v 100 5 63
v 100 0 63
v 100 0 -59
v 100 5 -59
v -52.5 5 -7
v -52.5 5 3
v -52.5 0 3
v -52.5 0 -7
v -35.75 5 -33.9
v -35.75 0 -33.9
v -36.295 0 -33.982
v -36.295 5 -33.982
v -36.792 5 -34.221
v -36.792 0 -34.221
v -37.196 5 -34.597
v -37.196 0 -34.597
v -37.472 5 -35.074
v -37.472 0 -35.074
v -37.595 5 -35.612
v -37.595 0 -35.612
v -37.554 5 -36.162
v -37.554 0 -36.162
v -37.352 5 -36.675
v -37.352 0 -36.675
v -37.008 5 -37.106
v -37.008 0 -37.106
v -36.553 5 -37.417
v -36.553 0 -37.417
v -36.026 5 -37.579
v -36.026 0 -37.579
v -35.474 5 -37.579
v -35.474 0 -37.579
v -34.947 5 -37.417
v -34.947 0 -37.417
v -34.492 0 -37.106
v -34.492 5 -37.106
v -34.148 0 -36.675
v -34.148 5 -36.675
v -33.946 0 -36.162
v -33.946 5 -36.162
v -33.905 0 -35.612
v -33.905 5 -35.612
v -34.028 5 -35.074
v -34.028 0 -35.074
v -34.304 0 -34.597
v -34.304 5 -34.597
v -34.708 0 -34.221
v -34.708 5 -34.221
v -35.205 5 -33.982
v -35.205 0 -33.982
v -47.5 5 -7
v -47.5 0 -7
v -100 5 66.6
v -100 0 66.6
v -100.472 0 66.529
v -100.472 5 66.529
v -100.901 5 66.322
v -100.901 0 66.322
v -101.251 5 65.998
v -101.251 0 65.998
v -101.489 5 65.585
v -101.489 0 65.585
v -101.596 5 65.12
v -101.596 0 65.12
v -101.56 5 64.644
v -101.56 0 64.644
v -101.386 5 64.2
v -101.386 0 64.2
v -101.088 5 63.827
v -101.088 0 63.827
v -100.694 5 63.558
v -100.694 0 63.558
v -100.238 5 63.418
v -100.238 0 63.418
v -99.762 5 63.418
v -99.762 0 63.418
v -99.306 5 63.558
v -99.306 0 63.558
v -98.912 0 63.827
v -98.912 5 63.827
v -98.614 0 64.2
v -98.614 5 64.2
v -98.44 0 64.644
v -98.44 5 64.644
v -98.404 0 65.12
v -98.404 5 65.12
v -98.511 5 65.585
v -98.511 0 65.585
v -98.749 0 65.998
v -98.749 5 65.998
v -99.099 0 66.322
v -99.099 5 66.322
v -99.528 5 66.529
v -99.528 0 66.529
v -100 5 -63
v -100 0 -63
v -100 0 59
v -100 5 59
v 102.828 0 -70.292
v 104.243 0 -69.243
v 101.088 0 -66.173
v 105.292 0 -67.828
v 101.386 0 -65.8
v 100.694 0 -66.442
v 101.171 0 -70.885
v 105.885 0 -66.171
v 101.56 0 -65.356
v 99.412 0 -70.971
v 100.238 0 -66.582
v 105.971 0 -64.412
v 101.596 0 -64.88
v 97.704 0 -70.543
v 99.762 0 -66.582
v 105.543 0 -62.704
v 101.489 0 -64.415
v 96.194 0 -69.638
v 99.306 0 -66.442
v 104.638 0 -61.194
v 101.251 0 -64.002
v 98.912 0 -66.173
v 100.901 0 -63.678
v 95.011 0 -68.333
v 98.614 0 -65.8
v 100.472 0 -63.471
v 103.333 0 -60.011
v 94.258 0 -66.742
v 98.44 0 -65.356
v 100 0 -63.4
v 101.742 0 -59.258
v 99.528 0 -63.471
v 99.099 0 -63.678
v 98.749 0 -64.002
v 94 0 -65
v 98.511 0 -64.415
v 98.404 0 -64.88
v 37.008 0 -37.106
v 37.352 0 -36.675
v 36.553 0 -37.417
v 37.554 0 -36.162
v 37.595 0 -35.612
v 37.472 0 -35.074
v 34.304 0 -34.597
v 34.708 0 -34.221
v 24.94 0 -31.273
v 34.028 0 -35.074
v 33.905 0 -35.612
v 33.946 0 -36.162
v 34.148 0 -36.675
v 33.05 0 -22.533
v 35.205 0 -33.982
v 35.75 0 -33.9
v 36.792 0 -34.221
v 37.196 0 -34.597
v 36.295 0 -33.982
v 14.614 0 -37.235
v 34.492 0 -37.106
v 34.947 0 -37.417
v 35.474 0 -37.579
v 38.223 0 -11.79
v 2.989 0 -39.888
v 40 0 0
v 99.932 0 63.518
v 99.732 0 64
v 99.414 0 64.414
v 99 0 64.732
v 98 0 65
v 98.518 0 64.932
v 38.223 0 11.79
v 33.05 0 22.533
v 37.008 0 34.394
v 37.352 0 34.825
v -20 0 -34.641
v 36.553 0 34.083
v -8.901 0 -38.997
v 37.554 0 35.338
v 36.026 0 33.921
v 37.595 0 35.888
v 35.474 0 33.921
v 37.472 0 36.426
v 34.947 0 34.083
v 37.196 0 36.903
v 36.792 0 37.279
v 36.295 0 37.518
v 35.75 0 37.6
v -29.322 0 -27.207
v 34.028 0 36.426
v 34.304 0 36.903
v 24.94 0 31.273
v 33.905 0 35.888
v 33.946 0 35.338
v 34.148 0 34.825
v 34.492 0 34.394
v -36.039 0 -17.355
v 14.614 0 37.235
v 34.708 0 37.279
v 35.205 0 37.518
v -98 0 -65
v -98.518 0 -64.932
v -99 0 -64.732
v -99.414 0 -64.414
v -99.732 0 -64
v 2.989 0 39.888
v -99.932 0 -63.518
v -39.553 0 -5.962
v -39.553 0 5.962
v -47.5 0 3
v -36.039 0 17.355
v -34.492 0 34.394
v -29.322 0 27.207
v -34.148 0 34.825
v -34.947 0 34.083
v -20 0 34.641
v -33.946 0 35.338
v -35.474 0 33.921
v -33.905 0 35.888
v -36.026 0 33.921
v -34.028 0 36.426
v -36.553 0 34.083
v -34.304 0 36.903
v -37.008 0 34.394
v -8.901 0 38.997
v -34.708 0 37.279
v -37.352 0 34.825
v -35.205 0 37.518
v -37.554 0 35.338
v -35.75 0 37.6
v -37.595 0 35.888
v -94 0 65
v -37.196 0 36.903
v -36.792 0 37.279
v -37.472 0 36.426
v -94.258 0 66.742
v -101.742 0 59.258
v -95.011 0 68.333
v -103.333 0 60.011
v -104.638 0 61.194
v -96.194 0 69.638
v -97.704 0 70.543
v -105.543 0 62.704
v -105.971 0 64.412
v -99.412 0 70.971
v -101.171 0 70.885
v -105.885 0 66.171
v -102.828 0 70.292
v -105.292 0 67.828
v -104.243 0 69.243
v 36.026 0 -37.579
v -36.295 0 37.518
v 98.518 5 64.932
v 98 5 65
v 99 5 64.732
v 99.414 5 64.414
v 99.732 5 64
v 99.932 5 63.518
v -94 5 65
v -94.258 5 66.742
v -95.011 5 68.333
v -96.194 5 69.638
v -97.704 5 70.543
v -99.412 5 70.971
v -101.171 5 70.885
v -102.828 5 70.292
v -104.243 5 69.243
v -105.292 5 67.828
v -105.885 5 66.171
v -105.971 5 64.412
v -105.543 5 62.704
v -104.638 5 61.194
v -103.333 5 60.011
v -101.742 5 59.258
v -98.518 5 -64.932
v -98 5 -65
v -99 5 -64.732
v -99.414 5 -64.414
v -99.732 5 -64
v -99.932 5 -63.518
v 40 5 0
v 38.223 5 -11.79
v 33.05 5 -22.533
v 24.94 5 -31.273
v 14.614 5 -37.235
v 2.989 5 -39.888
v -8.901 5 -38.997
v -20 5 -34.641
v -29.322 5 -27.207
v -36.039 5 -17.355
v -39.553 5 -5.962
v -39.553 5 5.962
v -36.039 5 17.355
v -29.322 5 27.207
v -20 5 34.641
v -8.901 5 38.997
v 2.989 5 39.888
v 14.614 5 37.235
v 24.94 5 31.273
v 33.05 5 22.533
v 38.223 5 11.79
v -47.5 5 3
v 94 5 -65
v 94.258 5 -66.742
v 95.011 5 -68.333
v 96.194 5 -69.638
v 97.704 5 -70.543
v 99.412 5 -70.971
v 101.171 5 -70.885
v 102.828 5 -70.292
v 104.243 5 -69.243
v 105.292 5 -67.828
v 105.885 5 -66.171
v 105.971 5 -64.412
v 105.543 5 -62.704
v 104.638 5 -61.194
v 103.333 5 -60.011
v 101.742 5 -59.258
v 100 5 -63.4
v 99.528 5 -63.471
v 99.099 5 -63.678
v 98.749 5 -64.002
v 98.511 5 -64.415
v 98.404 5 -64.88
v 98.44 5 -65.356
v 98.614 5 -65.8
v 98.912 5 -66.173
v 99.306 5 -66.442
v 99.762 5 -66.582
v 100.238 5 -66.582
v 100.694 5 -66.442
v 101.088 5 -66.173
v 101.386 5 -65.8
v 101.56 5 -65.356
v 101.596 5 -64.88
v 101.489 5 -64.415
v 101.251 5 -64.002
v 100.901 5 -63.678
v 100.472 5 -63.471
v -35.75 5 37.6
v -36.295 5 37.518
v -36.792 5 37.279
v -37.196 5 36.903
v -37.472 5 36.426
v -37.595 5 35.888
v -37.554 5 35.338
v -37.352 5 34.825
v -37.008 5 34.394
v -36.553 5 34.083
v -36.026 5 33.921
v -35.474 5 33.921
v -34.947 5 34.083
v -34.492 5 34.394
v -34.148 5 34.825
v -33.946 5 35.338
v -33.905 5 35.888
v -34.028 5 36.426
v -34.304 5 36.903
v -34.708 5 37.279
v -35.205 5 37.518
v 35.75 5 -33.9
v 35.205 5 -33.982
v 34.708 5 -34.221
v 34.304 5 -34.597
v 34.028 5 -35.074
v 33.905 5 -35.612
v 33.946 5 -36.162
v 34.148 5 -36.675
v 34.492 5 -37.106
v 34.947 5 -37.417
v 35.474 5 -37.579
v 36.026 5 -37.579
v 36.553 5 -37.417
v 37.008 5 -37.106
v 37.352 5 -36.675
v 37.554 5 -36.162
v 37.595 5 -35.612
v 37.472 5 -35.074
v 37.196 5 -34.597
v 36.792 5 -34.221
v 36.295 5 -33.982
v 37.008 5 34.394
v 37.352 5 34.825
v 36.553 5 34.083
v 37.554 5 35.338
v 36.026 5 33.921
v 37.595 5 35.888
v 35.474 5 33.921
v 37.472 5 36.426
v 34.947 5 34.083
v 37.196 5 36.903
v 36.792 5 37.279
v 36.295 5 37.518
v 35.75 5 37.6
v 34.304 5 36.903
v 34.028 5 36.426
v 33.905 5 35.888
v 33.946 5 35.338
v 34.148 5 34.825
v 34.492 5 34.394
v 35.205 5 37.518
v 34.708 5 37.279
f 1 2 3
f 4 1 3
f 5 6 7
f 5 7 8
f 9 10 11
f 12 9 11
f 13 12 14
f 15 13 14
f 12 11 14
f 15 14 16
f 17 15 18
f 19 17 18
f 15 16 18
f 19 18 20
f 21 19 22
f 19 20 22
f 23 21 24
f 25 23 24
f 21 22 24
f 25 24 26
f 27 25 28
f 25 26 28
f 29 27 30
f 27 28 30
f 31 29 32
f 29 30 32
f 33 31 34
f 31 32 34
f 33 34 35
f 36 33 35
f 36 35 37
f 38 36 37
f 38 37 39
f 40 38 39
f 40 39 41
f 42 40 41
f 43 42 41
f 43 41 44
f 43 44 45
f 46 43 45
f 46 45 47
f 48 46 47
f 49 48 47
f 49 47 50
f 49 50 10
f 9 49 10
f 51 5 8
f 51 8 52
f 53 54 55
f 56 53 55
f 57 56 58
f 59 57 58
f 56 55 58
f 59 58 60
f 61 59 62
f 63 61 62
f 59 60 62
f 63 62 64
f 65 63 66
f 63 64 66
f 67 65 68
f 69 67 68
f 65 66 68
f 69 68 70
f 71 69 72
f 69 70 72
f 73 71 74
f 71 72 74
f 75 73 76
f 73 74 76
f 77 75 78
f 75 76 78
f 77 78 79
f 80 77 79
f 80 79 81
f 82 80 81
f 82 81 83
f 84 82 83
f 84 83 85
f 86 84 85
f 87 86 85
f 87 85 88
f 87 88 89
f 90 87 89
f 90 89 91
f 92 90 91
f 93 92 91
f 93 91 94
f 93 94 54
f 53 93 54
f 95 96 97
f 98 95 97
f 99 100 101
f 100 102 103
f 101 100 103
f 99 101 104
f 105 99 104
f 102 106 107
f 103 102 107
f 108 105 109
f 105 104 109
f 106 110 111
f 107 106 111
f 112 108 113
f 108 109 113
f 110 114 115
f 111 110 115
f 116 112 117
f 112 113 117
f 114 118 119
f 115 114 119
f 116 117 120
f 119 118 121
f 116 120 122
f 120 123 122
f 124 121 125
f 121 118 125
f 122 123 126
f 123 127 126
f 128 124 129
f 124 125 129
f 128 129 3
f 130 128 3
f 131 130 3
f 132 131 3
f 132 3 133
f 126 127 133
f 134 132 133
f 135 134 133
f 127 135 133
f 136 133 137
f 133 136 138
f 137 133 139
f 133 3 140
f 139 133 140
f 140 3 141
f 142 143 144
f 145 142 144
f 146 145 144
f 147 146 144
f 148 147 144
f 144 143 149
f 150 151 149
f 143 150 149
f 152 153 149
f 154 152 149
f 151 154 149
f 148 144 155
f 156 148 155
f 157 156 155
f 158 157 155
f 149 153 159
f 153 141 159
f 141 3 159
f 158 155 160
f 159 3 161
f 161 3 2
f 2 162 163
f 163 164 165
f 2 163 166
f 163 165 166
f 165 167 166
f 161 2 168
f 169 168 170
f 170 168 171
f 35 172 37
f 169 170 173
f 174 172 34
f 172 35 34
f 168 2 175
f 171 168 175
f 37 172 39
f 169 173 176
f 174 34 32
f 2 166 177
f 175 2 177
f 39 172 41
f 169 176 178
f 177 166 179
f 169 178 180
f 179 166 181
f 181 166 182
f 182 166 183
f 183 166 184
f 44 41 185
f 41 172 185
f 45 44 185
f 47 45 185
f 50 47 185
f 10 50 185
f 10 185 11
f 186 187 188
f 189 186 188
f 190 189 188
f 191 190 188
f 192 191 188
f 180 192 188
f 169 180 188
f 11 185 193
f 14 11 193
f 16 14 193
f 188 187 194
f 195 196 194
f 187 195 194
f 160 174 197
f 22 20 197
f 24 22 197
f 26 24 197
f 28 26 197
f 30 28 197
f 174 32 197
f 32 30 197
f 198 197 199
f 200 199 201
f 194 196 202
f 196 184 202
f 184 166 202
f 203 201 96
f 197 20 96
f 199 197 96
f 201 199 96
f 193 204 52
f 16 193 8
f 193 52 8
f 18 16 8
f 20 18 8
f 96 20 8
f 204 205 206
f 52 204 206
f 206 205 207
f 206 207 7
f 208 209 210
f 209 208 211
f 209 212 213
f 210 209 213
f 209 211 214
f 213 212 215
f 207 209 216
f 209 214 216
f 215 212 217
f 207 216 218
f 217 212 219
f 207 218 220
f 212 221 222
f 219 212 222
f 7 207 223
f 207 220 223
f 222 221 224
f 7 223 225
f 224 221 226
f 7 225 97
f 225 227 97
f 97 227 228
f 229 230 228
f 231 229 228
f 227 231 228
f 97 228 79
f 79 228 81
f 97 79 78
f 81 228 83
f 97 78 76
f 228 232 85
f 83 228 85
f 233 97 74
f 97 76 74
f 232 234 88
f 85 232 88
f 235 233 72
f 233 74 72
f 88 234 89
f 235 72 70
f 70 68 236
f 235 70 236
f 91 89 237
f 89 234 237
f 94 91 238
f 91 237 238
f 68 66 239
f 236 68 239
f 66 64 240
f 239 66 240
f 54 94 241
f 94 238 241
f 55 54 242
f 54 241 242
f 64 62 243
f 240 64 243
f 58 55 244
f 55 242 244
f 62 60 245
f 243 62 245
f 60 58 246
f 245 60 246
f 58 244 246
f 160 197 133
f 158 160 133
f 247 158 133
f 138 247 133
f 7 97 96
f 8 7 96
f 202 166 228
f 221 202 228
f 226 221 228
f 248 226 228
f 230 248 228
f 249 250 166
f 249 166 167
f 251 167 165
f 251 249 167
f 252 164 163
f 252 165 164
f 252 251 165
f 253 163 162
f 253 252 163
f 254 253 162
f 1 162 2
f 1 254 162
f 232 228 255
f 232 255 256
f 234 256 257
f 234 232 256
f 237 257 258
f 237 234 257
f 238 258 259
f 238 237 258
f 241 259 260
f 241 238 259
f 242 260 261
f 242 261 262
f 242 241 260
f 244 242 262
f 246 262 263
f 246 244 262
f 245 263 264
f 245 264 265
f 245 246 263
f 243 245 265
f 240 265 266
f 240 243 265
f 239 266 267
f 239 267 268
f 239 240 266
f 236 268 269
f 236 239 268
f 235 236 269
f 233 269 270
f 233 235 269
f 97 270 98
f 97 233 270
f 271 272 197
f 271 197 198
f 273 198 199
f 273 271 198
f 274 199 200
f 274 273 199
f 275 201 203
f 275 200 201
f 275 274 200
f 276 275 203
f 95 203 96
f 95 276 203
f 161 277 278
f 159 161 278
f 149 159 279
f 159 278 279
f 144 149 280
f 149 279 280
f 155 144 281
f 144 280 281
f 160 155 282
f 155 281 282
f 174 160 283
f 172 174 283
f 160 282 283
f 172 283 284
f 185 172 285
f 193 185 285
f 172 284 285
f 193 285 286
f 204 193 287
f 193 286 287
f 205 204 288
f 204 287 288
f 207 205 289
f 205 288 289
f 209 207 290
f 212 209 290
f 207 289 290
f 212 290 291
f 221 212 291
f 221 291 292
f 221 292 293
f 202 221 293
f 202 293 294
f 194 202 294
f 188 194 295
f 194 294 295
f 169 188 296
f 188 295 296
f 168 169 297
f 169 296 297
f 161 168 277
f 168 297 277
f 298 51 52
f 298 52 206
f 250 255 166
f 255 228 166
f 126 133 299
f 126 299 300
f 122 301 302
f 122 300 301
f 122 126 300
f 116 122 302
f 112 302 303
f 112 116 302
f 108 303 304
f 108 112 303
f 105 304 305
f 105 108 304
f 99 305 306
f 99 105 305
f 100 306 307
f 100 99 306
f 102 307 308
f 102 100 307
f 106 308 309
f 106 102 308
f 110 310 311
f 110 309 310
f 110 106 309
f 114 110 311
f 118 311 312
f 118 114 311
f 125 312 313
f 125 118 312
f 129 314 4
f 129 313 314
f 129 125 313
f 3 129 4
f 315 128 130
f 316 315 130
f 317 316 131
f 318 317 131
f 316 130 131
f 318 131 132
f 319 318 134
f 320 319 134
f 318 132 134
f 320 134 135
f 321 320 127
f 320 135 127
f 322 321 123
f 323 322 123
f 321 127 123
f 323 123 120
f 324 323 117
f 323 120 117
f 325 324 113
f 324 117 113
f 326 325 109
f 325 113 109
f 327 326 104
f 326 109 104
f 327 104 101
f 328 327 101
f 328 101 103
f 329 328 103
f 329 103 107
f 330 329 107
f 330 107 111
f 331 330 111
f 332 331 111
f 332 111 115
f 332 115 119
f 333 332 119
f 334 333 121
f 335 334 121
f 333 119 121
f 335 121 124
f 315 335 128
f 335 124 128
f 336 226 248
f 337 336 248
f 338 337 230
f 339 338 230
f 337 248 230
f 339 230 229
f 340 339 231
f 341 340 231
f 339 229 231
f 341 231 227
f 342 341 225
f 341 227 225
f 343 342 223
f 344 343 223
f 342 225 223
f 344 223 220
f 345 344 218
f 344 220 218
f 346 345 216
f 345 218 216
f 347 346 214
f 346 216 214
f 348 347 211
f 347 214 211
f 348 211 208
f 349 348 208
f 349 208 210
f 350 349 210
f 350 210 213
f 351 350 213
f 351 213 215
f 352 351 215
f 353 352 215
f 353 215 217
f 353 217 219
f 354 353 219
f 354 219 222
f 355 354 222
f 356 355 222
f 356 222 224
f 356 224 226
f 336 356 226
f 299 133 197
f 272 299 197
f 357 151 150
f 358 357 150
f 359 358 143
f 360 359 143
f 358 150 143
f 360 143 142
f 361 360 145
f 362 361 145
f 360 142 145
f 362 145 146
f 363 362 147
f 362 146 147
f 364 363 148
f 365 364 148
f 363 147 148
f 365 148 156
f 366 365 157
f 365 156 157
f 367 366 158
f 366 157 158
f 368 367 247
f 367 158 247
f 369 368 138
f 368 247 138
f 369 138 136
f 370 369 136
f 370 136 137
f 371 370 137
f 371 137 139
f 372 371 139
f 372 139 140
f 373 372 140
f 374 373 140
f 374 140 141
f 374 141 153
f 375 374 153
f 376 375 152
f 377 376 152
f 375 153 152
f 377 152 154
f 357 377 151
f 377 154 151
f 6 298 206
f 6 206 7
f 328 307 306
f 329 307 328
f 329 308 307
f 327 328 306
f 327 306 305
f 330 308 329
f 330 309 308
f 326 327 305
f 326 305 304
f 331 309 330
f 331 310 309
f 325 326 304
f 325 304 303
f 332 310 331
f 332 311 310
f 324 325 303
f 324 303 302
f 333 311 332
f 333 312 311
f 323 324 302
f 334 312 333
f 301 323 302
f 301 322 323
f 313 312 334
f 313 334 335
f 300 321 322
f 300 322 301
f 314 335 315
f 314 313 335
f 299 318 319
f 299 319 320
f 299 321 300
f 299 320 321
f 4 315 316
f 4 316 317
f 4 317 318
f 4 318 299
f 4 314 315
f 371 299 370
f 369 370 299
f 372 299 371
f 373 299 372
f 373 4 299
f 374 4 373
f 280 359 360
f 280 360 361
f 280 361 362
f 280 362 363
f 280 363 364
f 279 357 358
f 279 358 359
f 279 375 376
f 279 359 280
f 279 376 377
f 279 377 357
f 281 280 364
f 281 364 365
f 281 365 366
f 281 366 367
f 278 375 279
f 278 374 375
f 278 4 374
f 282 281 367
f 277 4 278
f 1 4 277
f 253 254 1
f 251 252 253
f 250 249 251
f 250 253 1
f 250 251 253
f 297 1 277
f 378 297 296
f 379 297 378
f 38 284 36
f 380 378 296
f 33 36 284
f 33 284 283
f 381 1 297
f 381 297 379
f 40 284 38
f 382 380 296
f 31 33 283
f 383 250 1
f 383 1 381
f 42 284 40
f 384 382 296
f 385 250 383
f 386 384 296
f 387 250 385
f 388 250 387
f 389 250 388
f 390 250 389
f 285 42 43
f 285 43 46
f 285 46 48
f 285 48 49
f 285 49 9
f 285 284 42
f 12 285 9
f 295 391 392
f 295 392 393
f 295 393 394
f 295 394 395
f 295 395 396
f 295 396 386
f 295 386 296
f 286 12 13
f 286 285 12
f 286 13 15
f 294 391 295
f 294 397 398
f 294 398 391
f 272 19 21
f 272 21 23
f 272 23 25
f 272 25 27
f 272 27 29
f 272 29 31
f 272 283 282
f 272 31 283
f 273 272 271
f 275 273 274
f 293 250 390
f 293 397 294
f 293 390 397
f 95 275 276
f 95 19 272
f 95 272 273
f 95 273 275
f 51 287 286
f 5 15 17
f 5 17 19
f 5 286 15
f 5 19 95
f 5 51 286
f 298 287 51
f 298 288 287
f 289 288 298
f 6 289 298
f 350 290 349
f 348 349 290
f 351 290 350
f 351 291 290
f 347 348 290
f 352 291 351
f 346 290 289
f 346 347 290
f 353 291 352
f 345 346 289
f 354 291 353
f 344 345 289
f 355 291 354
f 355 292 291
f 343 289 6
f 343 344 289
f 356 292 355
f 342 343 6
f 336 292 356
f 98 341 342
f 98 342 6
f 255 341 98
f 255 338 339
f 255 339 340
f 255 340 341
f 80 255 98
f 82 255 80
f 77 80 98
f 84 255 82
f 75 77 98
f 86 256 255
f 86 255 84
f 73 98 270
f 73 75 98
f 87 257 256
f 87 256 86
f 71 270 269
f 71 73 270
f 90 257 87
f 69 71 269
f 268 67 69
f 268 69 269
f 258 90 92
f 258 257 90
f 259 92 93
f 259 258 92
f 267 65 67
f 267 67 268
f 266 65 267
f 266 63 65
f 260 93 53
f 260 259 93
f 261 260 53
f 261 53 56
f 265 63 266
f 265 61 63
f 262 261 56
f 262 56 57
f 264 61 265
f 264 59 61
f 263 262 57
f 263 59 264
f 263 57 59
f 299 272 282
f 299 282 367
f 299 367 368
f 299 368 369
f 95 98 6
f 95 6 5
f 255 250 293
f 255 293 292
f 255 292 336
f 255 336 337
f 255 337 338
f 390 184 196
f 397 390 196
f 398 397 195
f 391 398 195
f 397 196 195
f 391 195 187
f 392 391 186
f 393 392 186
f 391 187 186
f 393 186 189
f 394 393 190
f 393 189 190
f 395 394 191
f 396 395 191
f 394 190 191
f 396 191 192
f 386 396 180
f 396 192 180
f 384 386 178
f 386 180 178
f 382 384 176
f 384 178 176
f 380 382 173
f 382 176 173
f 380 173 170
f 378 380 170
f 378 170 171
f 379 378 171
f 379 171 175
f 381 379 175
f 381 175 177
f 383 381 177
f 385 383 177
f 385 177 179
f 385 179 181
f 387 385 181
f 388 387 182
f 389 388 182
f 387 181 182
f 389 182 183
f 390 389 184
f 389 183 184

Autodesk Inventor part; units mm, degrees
ref_plane "YZ Plane" through (0, 0, 0) normal (1, 0, 0) x (0, 1, 0)
ref_plane "XZ Plane" through (0, 0, 0) normal (0, 1, 0) x (-1, 0, 0)
ref_plane "XY Plane" through (0, 0, 0) normal (0, 0, 1) x (1, 0, 0)
sketch "Sketch1" plane through (0, 0, 0) normal (0, 1, 0) x (-1, 0, 0)
  line L0 (100, 65) -> (-100, 65)
  line L1 (-100, 65) -> (-100, -65)
  line L2 (-100, -65) -> (100, -65)
  line L3 (100, -65) -> (100, 65)
  line L4 (100, 65) -> (-100, -65) construction
  line L5 (-100, 65) -> (100, -65) construction
  circle A0 centre (100, 65) radius 6
  circle A1 centre (-100, -65) radius 6
  point P0 (0, 0)
  point P1 (94, 65)
  point P2 (100, 59)
  point P3 (-100, -59)
  point P4 (-94, -65)
  dimension "d0" = 200
  dimension "d1" = 130
  dimension "d4" = 12
extrude "Extrusion1" add sketch "Sketch1" along normal blind 5
fillet "Fillet1" radius 2 2 edges at (100, 2.5, 65) (-100, 2.5, -65)
sketch "Sketch2" plane through (0, 5, 0) normal (0, 1, 0) x (1, 0, 0)
  arc A0 (-98, 65) -> (-100, 63) centre (-98, 63) ccw projected
  line L0 (-100, 63) -> (-100, -59) projected
  arc A1 (-100, -59) -> (-94, -65) centre (-100, -65) ccw projected
  line L1 (-94, -65) -> (98, -65) projected
  arc A2 (98, -65) -> (100, -63) centre (98, -63) ccw projected
  line L2 (100, -63) -> (100, 59) projected
  arc A3 (100, 59) -> (94, 65) centre (100, 65) ccw projected
  line L3 (94, 65) -> (-98, 65) projected
  point P0 (0, 0)
hole "Hole1" at (100, 5, -65) at (-100, 5, 65) direction (0, -1, 0) diameter 3.2 end through all
sketch "Sketch3" plane through (0, 5, 0) normal (0, 1, 0) x (1, 0, 0)
  circle A0 centre (0, 0) radius 40
  dimension "d13" = 80
extrude "Extrusion2" cut sketch "Sketch3" against normal through all
sketch "Sketch4" plane through (0, 5, 0) normal (0, 1, 0) x (1, 0, 0)
  line L0 (-35.75, -35.75) -> (35.75, -35.75) construction
  line L1 (35.75, -35.75) -> (35.75, 35.75) construction
  line L2 (35.75, 35.75) -> (-35.75, 35.75) construction
  line L3 (-35.75, 35.75) -> (-35.75, -35.75) construction
  line L4 (-35.75, -35.75) -> (35.75, 35.75) construction
  line L5 (35.75, -35.75) -> (-35.75, 35.75) construction
  point P0 (0, 0)
  dimension "d16" = 71.5
hole "Hole2" at (-35.75, 5, -35.75) at (-35.75, 5, 35.75) at (35.75, 5, 35.75) at (35.75, 5, -35.75) direction (0, -1, 0) diameter 3.7 end through all
sketch "Sketch5" plane through (0, 5, 0) normal (0, 1, 0) x (1, 0, 0)
  line L0 (-52.5, 7) -> (-47.5, 7)
  line L1 (-47.5, 7) -> (-47.5, -3)
  line L2 (-47.5, -3) -> (-52.5, -3)
  line L3 (-52.5, -3) -> (-52.5, 7)
  line L4 (-52.5, 7) -> (-47.5, -3) construction
  line L5 (-47.5, 7) -> (-52.5, -3) construction
  line L6 (-100, 63) -> (-100, -59) projected
  point P0 (0, 0)
  point P1 (-50, 2)
  point P2 (-100, 2)
  point P3 (-100, 2)
  dimension "d24" = 50
  dimension "d25" = 5
  dimension "d26" = 10
extrude "Extrusion3" cut sketch "Sketch5" against normal through all
properties part number "LED Power Box (12V) Cover" material "ABS Plastic"
